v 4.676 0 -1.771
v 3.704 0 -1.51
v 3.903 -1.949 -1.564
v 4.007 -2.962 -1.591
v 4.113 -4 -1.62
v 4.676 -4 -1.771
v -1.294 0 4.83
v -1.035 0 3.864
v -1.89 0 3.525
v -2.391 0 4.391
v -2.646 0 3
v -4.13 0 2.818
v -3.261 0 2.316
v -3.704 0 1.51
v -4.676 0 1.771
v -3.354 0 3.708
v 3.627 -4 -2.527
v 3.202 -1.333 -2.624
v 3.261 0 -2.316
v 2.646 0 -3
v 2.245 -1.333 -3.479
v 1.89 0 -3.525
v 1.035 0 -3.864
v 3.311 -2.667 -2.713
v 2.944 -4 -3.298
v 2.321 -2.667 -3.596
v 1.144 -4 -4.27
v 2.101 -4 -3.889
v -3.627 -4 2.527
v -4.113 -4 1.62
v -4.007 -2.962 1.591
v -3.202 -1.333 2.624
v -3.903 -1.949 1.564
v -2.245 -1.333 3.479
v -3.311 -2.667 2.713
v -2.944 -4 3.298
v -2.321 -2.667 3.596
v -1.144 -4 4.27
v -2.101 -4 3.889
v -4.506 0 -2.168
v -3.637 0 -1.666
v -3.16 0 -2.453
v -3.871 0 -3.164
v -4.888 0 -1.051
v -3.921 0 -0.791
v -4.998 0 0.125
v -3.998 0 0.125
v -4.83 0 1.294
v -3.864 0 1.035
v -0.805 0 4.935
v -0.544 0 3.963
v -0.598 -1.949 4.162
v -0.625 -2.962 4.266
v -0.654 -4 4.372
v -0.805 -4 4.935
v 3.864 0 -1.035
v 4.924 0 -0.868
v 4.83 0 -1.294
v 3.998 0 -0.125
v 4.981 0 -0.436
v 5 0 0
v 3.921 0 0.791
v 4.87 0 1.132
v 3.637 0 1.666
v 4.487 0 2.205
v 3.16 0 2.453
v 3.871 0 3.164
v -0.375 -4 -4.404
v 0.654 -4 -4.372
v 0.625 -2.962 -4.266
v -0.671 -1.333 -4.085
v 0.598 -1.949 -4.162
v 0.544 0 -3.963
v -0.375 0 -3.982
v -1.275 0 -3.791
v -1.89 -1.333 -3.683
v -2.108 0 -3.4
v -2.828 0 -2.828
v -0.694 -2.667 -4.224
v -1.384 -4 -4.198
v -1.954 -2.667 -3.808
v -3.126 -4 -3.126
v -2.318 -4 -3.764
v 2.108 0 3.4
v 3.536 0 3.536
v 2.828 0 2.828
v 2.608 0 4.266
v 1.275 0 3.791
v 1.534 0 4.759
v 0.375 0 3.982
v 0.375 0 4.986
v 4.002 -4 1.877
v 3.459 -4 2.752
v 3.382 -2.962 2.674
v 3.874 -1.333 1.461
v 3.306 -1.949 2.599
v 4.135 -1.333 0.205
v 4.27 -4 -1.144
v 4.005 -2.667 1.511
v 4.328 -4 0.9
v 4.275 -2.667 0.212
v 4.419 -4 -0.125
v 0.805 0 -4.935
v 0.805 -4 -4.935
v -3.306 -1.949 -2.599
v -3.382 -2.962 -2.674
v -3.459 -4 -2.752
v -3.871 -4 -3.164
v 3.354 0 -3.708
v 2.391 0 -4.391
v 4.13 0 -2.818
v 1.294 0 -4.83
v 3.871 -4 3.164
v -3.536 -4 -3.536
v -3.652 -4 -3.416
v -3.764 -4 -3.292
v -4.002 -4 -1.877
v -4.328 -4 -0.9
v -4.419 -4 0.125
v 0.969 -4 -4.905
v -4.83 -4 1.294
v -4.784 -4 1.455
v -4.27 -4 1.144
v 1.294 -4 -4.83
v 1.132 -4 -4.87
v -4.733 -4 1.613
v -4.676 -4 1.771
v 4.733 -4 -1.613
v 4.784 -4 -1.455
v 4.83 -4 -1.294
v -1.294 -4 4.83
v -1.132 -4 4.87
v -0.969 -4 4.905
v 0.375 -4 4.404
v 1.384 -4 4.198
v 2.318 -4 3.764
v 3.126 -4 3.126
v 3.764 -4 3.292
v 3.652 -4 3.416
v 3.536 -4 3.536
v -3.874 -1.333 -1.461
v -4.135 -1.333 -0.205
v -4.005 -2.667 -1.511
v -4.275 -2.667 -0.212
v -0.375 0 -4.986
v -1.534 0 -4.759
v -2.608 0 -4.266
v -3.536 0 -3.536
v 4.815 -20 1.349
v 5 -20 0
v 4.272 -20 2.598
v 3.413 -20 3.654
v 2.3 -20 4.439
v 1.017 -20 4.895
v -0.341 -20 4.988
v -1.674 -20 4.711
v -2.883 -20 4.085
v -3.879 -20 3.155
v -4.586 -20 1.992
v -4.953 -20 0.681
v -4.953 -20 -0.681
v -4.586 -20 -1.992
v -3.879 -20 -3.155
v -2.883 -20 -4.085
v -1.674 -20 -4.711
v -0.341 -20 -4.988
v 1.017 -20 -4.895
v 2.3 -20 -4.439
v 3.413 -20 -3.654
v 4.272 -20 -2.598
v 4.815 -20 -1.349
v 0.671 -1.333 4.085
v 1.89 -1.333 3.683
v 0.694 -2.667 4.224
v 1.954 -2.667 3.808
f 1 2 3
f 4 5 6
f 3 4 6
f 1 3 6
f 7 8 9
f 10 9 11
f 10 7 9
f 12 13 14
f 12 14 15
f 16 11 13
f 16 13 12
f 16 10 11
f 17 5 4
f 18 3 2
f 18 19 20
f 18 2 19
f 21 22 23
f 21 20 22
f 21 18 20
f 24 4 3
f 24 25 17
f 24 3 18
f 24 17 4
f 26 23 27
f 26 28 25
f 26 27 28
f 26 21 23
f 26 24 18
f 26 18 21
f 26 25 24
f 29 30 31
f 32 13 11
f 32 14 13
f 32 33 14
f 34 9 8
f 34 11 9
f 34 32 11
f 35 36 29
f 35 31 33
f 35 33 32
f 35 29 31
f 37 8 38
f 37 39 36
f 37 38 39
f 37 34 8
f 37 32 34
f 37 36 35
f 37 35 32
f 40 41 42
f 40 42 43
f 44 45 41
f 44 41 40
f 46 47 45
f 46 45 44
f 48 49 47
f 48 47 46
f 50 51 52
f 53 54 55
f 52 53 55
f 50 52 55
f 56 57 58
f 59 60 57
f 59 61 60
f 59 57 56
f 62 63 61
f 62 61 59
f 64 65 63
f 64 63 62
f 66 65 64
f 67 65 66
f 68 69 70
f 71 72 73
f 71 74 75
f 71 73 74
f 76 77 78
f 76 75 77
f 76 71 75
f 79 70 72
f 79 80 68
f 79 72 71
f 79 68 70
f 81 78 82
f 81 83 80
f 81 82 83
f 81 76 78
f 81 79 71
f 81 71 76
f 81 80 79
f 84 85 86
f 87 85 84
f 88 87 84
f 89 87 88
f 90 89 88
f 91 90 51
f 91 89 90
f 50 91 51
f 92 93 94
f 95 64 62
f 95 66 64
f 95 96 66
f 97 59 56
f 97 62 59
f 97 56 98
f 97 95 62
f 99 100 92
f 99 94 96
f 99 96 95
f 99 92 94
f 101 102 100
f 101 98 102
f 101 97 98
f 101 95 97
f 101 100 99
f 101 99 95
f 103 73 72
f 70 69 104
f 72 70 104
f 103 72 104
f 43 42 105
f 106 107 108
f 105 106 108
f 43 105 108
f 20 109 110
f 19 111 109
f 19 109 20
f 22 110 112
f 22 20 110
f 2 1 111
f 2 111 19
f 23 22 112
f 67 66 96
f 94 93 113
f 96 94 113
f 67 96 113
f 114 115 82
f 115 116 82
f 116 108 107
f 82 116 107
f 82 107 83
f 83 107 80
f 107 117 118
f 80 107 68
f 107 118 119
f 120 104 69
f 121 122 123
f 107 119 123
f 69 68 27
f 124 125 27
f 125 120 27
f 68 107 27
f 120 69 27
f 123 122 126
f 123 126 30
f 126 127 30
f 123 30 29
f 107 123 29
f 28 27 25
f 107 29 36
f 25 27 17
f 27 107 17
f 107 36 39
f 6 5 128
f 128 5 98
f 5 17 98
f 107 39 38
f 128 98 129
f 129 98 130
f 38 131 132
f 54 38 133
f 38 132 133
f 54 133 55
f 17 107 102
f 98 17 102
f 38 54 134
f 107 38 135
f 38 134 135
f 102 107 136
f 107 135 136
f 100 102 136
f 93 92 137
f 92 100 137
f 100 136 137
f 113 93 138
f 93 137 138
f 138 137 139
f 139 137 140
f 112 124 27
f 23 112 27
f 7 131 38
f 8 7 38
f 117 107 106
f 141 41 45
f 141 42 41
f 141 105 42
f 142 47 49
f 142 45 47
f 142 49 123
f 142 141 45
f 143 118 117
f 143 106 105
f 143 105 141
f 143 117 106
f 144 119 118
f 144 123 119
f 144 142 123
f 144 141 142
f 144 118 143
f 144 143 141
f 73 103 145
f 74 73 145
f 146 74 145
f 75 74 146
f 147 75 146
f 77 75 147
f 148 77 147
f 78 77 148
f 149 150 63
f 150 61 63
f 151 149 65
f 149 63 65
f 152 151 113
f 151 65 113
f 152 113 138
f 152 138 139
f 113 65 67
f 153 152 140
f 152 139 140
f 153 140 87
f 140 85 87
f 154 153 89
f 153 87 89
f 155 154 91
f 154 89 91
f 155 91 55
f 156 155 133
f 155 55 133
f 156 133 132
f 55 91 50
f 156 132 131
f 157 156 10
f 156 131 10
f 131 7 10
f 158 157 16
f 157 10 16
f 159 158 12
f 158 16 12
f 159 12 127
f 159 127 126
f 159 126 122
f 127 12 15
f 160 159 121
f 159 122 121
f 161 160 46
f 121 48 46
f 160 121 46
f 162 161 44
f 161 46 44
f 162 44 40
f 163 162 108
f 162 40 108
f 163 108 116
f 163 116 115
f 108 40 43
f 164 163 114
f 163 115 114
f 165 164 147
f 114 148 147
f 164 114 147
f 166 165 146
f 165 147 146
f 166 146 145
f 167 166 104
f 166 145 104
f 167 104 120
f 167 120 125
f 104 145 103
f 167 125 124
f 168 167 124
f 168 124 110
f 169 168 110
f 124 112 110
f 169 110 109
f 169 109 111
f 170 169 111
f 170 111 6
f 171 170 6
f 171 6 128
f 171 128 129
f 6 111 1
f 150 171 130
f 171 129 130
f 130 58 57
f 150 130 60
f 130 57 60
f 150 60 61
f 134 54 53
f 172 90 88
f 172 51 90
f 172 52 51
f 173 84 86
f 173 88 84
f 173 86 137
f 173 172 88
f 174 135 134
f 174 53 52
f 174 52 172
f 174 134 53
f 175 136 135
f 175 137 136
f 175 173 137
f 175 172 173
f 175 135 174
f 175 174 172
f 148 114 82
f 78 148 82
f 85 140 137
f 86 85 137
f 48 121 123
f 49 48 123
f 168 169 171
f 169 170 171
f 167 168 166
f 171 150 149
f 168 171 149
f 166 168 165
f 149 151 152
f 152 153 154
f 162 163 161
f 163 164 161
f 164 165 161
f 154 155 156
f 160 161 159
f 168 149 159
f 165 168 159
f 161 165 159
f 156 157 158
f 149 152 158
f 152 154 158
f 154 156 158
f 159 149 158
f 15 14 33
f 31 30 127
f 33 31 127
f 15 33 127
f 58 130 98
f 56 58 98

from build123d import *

# Parameters (mm, degrees)
SKETCH2_W             = 5
SKETCH2_H             = 20
SLOTS_START           = -4
SLOTS_DEPTH           = 4.5
SLOT_CIRPATTERN_COUNT = 6
SKETCH4_R             = 4
JOYSTICKHOLE_DEPTH    = 4
JOYSTICKHOLE_TAPER    = -6


with BuildPart() as part:
    # Sketch2 → Mount (revolve)
    with BuildSketch(Plane.XY):
        with Locations((2.5, -10)):
            Rectangle(SKETCH2_W, SKETCH2_H)
    revolve(axis=Axis((0, 5.533812346, 0), (0, -1, 0)))

    # Sketch3 → Slots (cut)
    with BuildSketch(Plane(origin=(0, 0, 0), x_dir=(1, 0, 0), z_dir=(0, 1, 0)).offset(SLOTS_START)):
        Polygon((-4.242640687, 4.242640687), (0, 0), (-0.353553391, -0.353553391), (-4.596194078, 3.889087297), align=None)
    slots = extrude(amount=SLOTS_DEPTH, mode=Mode.SUBTRACT)

    # Slot CirPattern: Slots ×6 about axis
    slot_cirpattern_axis = Axis((0, 0, 0), (0, 1, 0))
    for i in range(1, SLOT_CIRPATTERN_COUNT):
        add(slots.rotate(slot_cirpattern_axis, i * 360 / SLOT_CIRPATTERN_COUNT), mode=Mode.SUBTRACT)

    # Sketch4 → JoystickHole (cut)
    with BuildSketch(Plane(origin=(0, 0, 0), x_dir=(1, 0, 0), z_dir=(0, 1, 0))):
        Circle(SKETCH4_R)
    extrude(amount=-JOYSTICKHOLE_DEPTH, taper=JOYSTICKHOLE_TAPER, mode=Mode.SUBTRACT)


solid = part.part
